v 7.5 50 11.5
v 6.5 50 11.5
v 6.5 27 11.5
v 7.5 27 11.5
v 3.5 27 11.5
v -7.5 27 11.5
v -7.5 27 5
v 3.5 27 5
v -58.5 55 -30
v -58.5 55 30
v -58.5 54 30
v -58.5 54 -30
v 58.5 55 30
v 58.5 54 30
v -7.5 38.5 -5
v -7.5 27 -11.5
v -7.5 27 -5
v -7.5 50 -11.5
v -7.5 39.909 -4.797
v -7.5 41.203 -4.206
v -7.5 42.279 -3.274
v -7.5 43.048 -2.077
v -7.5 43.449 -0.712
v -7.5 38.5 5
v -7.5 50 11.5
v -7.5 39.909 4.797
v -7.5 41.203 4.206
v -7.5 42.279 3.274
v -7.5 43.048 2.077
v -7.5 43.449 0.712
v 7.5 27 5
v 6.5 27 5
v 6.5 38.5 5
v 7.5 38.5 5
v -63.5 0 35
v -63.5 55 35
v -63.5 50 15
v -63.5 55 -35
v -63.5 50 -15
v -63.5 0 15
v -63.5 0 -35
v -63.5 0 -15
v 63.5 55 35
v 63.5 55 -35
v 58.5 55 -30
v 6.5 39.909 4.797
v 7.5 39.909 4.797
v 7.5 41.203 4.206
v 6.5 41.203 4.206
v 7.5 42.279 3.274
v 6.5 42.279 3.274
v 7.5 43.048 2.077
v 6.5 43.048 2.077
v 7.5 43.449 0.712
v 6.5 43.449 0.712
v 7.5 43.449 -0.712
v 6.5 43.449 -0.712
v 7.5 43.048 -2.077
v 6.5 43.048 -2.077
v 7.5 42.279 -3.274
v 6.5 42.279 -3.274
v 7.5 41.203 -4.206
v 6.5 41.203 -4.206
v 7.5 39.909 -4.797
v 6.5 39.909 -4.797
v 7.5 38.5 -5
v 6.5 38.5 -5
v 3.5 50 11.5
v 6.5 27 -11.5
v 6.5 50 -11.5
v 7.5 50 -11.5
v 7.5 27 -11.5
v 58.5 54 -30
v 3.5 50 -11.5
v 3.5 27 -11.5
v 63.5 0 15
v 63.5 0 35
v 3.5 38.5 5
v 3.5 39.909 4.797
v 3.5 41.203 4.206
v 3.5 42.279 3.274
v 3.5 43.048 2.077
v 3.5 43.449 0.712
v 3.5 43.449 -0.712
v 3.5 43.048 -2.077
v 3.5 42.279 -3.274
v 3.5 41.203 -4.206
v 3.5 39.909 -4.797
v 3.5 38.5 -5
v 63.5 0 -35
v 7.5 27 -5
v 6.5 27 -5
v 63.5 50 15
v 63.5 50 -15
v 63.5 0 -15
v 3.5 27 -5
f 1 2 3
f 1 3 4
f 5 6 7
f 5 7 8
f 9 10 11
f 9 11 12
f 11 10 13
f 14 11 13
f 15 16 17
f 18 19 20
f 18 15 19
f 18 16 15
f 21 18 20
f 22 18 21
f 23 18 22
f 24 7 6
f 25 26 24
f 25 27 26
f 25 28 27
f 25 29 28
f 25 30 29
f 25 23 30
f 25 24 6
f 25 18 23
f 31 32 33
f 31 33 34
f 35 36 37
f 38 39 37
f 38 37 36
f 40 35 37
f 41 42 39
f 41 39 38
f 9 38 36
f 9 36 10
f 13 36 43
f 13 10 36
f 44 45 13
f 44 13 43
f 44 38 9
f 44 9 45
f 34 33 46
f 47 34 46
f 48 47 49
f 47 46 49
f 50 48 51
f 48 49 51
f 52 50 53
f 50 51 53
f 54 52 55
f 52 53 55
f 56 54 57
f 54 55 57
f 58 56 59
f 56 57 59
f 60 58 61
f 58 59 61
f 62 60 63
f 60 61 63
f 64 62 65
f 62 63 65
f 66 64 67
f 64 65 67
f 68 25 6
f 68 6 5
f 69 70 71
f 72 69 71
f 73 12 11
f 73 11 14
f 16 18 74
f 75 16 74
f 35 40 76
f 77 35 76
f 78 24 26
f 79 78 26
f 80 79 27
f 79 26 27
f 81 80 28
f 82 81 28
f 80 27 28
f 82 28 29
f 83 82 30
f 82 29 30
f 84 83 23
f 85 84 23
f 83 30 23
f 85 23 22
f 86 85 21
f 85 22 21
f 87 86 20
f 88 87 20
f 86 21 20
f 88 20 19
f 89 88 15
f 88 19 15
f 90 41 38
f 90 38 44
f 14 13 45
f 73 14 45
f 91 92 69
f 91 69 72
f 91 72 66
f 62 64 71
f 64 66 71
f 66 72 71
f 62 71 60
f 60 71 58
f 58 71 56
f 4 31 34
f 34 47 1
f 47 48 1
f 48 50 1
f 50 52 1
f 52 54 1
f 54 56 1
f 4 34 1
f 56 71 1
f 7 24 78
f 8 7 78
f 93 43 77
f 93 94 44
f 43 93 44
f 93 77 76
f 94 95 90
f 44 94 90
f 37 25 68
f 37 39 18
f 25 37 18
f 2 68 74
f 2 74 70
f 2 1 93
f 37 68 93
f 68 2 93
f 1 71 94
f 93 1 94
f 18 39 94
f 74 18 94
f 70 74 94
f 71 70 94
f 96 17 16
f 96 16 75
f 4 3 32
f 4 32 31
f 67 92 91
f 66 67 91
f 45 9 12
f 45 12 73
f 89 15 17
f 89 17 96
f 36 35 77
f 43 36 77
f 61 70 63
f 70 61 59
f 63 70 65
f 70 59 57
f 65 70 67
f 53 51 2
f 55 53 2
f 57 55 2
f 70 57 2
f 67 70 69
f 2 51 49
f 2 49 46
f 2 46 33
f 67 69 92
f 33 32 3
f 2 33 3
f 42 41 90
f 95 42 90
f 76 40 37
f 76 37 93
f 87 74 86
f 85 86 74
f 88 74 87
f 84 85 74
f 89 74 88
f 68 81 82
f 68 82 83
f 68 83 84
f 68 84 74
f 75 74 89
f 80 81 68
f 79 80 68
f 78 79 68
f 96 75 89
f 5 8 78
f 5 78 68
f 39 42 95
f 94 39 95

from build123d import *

# Parameters (mm, degrees)
SKETCH2_W           = 127
SKETCH2_H           = 70
BOSS_EXTRUDE1_DEPTH = 55
SKETCH4_W           = 127
SKETCH4_H           = 30
CUT_EXTRUDE1_DEPTH  = 50
SKETCH5_W           = 15
SKETCH5_H           = 23
BOSS_EXTRUDE2_DEPTH = 23
SKETCH6_W           = 3
SKETCH6_H           = 23
CUT_EXTRUDE2_DEPTH  = 23
SKETCH9_W           = 15
SKETCH9_H           = 10
CUT_EXTRUDE3_DEPTH  = 11.5
SKETCH10_W          = 117
SKETCH10_H          = 60
CUT_EXTRUDE4_DEPTH  = 1
SKETCH12_R          = 5
CUT_EXTRUDE5_DEPTH  = 300


with BuildPart() as part:
    # Sketch2 → Boss-Extrude1 (new body)
    with BuildSketch(Plane(origin=(0, 0, 0), x_dir=(1, 0, 0), z_dir=(0, 1, 0))):
        Rectangle(SKETCH2_W, SKETCH2_H)
    extrude(amount=BOSS_EXTRUDE1_DEPTH)

    # Sketch4 → Cut-Extrude1 (cut)
    with BuildSketch(Plane(origin=(0, 0, 0), x_dir=(1, 0, 0), z_dir=(0, 1, 0))):
        Rectangle(SKETCH4_W, SKETCH4_H)
    extrude(amount=CUT_EXTRUDE1_DEPTH, mode=Mode.SUBTRACT)

    # Sketch5 → Boss-Extrude2 (add)
    with BuildSketch(Plane.XZ.offset(-50)):
        Rectangle(SKETCH5_W, SKETCH5_H)
    extrude(amount=BOSS_EXTRUDE2_DEPTH)

    # Sketch6 → Cut-Extrude2 (cut)
    with BuildSketch(Plane.XZ.offset(-27)):
        with Locations((5, 0)):
            Rectangle(SKETCH6_W, SKETCH6_H)
    extrude(amount=-CUT_EXTRUDE2_DEPTH, mode=Mode.SUBTRACT)

    # Sketch9 → Cut-Extrude3 (cut)
    with BuildSketch(Plane(origin=(0, 27, 0), x_dir=(1, 0, 0), z_dir=(0, 1, 0))):
        Rectangle(SKETCH9_W, SKETCH9_H)
    extrude(amount=CUT_EXTRUDE3_DEPTH, mode=Mode.SUBTRACT)

    # Sketch10 → Cut-Extrude4 (cut)
    with BuildSketch(Plane(origin=(0, 55, 0), x_dir=(1, 0, 0), z_dir=(0, 1, 0))):
        Rectangle(SKETCH10_W, SKETCH10_H)
    extrude(amount=-CUT_EXTRUDE4_DEPTH, mode=Mode.SUBTRACT)

    # Sketch12 → Cut-Extrude5 (cut)
    with BuildSketch(Plane.ZY.offset(7.5)):
        with Locations((0, 38.5)):
            Circle(SKETCH12_R)
    extrude(amount=-CUT_EXTRUDE5_DEPTH, mode=Mode.SUBTRACT)


solid = part.part
